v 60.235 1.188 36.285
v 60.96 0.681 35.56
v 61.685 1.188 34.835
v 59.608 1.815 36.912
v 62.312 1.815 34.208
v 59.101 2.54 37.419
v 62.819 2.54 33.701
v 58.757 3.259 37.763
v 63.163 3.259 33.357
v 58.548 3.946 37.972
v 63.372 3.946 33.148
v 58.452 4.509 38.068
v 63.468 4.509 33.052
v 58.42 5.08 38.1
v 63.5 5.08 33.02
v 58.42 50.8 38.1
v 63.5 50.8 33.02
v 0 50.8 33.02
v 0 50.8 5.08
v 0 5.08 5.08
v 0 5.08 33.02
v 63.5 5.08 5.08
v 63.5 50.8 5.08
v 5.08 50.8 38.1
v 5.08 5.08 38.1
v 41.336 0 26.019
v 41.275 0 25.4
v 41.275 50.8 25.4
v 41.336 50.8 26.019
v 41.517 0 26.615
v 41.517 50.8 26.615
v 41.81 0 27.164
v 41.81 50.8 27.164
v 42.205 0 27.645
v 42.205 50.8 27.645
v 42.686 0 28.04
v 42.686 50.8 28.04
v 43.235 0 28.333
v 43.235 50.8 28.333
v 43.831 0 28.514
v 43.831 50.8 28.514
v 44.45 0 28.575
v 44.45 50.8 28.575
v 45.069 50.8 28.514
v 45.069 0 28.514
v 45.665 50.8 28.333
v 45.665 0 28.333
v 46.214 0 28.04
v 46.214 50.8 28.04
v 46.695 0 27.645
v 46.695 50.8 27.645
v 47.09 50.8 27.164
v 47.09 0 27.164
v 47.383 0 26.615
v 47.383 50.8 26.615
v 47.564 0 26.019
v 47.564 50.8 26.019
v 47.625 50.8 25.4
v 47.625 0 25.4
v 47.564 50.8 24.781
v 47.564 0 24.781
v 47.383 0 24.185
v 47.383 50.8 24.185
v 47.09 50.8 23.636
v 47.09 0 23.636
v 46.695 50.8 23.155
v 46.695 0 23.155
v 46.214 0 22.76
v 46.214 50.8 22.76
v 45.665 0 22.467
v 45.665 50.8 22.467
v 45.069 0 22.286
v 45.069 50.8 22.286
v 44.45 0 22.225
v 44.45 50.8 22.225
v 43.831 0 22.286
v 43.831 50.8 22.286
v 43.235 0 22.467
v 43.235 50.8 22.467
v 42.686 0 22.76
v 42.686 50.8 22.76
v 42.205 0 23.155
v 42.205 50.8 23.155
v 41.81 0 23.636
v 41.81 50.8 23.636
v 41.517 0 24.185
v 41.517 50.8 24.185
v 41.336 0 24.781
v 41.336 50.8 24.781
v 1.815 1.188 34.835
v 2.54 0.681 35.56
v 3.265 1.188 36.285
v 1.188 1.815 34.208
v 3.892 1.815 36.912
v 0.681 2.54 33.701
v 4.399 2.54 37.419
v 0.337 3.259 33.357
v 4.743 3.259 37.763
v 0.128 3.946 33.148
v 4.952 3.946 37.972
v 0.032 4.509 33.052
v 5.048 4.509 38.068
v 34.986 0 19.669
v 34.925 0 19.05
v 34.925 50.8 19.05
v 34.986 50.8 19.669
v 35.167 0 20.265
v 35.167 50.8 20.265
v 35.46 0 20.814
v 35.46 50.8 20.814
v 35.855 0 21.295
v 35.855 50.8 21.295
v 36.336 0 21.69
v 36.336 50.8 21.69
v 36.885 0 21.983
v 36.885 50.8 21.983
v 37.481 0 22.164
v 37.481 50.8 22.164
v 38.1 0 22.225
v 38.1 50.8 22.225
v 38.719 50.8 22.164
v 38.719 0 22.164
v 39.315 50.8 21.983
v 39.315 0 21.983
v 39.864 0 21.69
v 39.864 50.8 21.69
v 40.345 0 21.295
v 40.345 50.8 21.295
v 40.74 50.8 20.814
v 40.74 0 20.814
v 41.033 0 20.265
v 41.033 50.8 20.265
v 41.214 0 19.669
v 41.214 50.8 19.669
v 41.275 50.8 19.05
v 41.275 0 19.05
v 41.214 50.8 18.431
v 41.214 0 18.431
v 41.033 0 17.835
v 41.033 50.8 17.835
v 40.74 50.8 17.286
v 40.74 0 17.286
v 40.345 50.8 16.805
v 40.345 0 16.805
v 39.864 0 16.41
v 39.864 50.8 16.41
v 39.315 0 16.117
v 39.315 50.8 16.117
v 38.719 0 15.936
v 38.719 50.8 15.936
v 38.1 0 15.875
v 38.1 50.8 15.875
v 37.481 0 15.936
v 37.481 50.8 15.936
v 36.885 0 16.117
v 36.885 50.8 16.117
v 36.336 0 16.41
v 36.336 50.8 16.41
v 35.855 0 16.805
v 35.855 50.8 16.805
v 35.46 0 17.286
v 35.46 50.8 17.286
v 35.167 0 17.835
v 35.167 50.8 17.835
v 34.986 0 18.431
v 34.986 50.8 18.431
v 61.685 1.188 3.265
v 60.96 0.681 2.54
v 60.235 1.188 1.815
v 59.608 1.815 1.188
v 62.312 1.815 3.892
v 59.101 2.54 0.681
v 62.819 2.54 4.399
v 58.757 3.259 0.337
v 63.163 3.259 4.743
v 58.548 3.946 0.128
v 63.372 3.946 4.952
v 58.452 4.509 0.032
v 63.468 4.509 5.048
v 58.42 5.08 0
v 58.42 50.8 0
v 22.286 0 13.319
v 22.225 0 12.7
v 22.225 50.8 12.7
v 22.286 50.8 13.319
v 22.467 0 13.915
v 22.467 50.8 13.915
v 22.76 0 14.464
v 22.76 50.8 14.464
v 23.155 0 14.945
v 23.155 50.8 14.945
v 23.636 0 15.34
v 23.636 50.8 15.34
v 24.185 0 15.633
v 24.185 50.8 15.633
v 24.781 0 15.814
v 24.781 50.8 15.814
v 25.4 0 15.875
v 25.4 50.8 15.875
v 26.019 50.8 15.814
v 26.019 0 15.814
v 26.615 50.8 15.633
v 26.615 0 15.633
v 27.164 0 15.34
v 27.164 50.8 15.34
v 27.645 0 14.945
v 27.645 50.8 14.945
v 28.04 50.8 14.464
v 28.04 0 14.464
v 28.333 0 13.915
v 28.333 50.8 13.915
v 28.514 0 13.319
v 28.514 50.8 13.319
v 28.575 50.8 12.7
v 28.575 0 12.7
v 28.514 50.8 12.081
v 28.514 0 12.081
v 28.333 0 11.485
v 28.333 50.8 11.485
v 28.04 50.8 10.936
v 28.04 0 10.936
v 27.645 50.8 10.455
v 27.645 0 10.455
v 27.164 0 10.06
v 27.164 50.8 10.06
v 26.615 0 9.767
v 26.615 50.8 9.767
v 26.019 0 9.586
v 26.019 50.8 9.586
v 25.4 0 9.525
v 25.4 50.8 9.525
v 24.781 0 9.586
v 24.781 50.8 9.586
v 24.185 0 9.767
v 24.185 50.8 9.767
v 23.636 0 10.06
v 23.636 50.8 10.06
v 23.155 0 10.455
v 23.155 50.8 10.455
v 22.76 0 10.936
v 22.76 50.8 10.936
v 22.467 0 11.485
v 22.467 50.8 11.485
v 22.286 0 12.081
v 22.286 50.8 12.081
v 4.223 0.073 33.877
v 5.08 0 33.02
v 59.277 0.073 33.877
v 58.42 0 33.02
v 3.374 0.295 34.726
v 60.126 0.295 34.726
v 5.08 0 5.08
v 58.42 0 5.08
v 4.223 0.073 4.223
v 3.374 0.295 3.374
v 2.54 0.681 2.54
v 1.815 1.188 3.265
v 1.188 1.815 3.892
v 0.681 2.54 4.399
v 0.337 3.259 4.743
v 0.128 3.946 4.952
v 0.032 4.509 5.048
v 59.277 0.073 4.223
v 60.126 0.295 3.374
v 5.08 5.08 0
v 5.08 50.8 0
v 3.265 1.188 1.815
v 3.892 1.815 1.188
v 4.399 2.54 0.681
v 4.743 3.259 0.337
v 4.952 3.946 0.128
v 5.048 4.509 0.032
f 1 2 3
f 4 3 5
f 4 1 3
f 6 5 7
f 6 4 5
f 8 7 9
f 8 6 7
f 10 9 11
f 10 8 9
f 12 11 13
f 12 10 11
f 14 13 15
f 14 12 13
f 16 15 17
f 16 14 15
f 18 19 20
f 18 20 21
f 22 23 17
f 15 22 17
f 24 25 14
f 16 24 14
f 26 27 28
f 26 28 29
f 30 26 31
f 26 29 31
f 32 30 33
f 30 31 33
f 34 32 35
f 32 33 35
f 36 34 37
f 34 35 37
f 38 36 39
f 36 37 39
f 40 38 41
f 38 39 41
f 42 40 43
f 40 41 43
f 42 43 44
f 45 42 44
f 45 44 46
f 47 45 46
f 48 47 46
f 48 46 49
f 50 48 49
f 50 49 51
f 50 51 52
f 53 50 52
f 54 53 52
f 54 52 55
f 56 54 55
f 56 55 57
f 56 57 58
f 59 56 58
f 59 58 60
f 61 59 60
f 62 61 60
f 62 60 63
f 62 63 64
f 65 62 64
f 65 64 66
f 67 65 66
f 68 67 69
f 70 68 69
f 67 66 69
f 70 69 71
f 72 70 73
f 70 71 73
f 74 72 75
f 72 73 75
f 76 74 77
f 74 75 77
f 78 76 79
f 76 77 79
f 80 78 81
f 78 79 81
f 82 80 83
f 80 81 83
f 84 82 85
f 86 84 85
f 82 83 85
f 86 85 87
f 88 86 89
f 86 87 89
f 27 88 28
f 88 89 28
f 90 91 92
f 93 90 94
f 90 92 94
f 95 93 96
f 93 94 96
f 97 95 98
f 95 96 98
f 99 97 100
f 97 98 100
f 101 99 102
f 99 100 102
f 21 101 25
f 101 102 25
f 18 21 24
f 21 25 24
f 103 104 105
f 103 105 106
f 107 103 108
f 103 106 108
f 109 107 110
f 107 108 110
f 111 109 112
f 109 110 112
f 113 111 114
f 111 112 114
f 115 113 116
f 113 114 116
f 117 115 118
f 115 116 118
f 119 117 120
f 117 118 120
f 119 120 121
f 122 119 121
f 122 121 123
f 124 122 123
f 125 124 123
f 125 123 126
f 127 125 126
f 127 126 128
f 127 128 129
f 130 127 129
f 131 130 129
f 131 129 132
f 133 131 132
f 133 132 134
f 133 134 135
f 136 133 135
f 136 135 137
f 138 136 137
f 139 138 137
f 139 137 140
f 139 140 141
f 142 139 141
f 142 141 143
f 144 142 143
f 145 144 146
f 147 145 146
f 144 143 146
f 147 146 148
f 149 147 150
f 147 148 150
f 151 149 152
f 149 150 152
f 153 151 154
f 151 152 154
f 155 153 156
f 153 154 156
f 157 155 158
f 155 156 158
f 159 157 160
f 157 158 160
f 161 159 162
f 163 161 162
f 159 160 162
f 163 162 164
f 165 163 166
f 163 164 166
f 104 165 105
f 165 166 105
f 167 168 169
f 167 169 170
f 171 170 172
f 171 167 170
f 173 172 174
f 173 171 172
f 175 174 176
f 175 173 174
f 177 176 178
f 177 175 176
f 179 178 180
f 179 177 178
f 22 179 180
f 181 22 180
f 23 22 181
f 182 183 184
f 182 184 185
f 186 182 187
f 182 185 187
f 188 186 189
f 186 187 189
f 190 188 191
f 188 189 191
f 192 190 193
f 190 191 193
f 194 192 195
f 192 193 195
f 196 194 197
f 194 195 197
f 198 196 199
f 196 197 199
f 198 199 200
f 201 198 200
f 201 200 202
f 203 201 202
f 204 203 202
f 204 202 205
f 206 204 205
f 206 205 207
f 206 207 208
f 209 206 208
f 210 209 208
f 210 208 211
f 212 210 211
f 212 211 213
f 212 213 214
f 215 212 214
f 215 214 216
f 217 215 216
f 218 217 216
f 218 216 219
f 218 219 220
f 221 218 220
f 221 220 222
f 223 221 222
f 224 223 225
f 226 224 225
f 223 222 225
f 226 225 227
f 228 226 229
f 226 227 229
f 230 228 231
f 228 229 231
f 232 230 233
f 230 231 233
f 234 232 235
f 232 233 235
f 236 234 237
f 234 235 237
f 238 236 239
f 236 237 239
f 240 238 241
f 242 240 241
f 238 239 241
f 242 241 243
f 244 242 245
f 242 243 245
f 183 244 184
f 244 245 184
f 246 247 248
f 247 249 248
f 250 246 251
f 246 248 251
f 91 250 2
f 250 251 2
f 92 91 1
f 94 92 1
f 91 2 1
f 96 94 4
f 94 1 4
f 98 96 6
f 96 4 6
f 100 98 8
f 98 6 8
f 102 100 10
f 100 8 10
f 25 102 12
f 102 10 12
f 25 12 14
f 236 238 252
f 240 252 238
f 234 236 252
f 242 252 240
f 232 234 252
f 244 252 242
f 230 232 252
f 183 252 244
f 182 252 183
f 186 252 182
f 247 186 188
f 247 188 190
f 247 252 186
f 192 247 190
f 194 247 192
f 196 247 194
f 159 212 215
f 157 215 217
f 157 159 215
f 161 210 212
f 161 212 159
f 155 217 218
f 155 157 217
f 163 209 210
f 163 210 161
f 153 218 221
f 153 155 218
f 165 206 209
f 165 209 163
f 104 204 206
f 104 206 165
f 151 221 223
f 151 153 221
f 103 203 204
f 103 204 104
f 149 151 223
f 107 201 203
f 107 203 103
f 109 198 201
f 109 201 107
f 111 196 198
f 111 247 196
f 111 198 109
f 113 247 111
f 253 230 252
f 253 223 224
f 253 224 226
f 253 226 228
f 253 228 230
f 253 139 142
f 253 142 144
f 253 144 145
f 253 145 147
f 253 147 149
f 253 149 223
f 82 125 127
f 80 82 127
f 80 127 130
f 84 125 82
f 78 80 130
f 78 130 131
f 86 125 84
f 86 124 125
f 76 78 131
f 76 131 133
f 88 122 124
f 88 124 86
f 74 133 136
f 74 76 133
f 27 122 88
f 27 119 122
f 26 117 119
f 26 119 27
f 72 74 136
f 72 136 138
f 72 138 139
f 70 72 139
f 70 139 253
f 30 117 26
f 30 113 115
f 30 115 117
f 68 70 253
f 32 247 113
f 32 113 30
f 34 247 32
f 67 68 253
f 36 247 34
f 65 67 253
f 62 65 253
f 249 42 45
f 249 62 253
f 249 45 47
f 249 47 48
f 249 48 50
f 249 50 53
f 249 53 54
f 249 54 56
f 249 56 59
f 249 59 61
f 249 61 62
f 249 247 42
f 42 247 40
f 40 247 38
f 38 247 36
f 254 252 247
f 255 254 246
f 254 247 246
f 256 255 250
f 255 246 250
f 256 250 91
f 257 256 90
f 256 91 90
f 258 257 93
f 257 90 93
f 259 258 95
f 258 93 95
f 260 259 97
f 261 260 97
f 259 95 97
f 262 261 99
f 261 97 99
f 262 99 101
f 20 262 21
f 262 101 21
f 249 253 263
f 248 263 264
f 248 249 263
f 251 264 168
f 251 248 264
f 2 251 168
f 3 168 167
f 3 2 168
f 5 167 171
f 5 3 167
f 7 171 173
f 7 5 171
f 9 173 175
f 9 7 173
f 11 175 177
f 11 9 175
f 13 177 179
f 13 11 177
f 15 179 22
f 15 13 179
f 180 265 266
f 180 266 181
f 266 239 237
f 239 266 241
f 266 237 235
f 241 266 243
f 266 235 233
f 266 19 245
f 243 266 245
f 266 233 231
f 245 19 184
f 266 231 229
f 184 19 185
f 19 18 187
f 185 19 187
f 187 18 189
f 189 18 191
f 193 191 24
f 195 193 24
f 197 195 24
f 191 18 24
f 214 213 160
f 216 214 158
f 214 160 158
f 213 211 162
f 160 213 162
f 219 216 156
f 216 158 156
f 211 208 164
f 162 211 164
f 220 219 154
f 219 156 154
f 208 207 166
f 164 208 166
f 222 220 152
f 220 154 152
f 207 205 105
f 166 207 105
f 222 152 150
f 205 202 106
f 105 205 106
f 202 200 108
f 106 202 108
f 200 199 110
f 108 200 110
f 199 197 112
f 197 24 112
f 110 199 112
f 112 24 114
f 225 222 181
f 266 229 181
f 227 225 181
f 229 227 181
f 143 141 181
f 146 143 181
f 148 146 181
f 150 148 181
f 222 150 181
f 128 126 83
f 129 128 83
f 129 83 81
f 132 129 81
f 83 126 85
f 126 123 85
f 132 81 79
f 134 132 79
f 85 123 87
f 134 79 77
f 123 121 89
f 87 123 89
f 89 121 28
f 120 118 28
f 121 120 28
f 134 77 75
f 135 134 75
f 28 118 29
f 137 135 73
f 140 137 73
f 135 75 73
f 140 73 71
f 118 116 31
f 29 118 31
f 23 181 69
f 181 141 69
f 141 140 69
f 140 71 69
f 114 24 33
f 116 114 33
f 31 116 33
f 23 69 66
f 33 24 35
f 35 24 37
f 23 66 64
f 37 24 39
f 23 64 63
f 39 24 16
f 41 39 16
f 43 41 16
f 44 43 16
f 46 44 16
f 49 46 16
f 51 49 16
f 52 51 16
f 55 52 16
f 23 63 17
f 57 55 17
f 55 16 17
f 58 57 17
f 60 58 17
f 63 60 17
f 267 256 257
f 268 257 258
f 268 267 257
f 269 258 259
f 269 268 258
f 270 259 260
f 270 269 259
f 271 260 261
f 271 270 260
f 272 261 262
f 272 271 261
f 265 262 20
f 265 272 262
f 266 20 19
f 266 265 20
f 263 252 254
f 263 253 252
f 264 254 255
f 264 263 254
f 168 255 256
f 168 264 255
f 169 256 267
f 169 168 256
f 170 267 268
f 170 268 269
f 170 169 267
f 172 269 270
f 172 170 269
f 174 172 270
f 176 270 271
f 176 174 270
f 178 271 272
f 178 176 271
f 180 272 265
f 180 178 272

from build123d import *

# Parameters (mm, degrees)
F0_W     = 63.5
F0_H     = 38.1
F1_DEPTH = 50.8
F2_SIZE  = 5.08
F3_R     = 5.08
F3_R_2   = 5.07999
F5_D     = 6.35


# Not quite as in the source:
# - a fillet or chamfer is up to 0.001 mm smaller than in the source, because OpenCascade refuses the exact size


with BuildPart() as f1:
    # F0 (on Front) → F1 (new body)
    with BuildSketch(Plane.XZ):
        with Locations((31.75, 19.05)):
            Rectangle(F0_W, F0_H)
    extrude(amount=-F1_DEPTH)

    # F2
    f2_edges = [f1.edges().sort_by_distance(p)[0] for p in [
        (63.5, 25.4, 38.1),
        (0, 25.4, 38.1),
        (63.5, 25.4, 0),
        (0, 25.4, 0),
    ]]
    chamfer(f2_edges, length=F2_SIZE)

    # F3 (call 1 of 4: OpenCascade refuses the feature's edges together)
    f3_edges = [f1.edges().sort_by_distance(p)[0] for p in [
        (63.5, 0, 19.05),
    ]]
    fillet(f3_edges, radius=F3_R)

    # F3#2 (call 2 of 4)
    f3_2_edges = [f1.edges().sort_by_distance(p)[0] for p in [
        (0, 0, 19.05),
    ]]
    fillet(f3_2_edges, radius=F3_R)

    # F3#3 (call 3 of 4) (radius 5.08 in the source; OpenCascade refuses exactly that, so slightly less here)
    f3_3_edges = [f1.edges().sort_by_distance(p)[0] for p in [
        (31.75, 0, 0),
    ]]
    fillet(f3_3_edges, radius=F3_R_2)

    # F3#4 (call 4 of 4) (radius 5.08 in the source; OpenCascade refuses exactly that, so slightly less here)
    f3_4_edges = [f1.edges().sort_by_distance(p)[0] for p in [
        (31.75, 0, 38.1),
    ]]
    fillet(f3_4_edges, radius=F3_R_2)

    # F5 (through all)
    with Locations(Plane.XZ):
        with Locations((25.4, 12.7), (44.45, 25.4), (38.1, 19.05)):
            Hole(F5_D / 2)


with BuildPart() as f6_1:
    # F6: copy of F1
    add(f1.part.moved(Location((50.8, 50.8, 50.8))))


solid = f1.part
